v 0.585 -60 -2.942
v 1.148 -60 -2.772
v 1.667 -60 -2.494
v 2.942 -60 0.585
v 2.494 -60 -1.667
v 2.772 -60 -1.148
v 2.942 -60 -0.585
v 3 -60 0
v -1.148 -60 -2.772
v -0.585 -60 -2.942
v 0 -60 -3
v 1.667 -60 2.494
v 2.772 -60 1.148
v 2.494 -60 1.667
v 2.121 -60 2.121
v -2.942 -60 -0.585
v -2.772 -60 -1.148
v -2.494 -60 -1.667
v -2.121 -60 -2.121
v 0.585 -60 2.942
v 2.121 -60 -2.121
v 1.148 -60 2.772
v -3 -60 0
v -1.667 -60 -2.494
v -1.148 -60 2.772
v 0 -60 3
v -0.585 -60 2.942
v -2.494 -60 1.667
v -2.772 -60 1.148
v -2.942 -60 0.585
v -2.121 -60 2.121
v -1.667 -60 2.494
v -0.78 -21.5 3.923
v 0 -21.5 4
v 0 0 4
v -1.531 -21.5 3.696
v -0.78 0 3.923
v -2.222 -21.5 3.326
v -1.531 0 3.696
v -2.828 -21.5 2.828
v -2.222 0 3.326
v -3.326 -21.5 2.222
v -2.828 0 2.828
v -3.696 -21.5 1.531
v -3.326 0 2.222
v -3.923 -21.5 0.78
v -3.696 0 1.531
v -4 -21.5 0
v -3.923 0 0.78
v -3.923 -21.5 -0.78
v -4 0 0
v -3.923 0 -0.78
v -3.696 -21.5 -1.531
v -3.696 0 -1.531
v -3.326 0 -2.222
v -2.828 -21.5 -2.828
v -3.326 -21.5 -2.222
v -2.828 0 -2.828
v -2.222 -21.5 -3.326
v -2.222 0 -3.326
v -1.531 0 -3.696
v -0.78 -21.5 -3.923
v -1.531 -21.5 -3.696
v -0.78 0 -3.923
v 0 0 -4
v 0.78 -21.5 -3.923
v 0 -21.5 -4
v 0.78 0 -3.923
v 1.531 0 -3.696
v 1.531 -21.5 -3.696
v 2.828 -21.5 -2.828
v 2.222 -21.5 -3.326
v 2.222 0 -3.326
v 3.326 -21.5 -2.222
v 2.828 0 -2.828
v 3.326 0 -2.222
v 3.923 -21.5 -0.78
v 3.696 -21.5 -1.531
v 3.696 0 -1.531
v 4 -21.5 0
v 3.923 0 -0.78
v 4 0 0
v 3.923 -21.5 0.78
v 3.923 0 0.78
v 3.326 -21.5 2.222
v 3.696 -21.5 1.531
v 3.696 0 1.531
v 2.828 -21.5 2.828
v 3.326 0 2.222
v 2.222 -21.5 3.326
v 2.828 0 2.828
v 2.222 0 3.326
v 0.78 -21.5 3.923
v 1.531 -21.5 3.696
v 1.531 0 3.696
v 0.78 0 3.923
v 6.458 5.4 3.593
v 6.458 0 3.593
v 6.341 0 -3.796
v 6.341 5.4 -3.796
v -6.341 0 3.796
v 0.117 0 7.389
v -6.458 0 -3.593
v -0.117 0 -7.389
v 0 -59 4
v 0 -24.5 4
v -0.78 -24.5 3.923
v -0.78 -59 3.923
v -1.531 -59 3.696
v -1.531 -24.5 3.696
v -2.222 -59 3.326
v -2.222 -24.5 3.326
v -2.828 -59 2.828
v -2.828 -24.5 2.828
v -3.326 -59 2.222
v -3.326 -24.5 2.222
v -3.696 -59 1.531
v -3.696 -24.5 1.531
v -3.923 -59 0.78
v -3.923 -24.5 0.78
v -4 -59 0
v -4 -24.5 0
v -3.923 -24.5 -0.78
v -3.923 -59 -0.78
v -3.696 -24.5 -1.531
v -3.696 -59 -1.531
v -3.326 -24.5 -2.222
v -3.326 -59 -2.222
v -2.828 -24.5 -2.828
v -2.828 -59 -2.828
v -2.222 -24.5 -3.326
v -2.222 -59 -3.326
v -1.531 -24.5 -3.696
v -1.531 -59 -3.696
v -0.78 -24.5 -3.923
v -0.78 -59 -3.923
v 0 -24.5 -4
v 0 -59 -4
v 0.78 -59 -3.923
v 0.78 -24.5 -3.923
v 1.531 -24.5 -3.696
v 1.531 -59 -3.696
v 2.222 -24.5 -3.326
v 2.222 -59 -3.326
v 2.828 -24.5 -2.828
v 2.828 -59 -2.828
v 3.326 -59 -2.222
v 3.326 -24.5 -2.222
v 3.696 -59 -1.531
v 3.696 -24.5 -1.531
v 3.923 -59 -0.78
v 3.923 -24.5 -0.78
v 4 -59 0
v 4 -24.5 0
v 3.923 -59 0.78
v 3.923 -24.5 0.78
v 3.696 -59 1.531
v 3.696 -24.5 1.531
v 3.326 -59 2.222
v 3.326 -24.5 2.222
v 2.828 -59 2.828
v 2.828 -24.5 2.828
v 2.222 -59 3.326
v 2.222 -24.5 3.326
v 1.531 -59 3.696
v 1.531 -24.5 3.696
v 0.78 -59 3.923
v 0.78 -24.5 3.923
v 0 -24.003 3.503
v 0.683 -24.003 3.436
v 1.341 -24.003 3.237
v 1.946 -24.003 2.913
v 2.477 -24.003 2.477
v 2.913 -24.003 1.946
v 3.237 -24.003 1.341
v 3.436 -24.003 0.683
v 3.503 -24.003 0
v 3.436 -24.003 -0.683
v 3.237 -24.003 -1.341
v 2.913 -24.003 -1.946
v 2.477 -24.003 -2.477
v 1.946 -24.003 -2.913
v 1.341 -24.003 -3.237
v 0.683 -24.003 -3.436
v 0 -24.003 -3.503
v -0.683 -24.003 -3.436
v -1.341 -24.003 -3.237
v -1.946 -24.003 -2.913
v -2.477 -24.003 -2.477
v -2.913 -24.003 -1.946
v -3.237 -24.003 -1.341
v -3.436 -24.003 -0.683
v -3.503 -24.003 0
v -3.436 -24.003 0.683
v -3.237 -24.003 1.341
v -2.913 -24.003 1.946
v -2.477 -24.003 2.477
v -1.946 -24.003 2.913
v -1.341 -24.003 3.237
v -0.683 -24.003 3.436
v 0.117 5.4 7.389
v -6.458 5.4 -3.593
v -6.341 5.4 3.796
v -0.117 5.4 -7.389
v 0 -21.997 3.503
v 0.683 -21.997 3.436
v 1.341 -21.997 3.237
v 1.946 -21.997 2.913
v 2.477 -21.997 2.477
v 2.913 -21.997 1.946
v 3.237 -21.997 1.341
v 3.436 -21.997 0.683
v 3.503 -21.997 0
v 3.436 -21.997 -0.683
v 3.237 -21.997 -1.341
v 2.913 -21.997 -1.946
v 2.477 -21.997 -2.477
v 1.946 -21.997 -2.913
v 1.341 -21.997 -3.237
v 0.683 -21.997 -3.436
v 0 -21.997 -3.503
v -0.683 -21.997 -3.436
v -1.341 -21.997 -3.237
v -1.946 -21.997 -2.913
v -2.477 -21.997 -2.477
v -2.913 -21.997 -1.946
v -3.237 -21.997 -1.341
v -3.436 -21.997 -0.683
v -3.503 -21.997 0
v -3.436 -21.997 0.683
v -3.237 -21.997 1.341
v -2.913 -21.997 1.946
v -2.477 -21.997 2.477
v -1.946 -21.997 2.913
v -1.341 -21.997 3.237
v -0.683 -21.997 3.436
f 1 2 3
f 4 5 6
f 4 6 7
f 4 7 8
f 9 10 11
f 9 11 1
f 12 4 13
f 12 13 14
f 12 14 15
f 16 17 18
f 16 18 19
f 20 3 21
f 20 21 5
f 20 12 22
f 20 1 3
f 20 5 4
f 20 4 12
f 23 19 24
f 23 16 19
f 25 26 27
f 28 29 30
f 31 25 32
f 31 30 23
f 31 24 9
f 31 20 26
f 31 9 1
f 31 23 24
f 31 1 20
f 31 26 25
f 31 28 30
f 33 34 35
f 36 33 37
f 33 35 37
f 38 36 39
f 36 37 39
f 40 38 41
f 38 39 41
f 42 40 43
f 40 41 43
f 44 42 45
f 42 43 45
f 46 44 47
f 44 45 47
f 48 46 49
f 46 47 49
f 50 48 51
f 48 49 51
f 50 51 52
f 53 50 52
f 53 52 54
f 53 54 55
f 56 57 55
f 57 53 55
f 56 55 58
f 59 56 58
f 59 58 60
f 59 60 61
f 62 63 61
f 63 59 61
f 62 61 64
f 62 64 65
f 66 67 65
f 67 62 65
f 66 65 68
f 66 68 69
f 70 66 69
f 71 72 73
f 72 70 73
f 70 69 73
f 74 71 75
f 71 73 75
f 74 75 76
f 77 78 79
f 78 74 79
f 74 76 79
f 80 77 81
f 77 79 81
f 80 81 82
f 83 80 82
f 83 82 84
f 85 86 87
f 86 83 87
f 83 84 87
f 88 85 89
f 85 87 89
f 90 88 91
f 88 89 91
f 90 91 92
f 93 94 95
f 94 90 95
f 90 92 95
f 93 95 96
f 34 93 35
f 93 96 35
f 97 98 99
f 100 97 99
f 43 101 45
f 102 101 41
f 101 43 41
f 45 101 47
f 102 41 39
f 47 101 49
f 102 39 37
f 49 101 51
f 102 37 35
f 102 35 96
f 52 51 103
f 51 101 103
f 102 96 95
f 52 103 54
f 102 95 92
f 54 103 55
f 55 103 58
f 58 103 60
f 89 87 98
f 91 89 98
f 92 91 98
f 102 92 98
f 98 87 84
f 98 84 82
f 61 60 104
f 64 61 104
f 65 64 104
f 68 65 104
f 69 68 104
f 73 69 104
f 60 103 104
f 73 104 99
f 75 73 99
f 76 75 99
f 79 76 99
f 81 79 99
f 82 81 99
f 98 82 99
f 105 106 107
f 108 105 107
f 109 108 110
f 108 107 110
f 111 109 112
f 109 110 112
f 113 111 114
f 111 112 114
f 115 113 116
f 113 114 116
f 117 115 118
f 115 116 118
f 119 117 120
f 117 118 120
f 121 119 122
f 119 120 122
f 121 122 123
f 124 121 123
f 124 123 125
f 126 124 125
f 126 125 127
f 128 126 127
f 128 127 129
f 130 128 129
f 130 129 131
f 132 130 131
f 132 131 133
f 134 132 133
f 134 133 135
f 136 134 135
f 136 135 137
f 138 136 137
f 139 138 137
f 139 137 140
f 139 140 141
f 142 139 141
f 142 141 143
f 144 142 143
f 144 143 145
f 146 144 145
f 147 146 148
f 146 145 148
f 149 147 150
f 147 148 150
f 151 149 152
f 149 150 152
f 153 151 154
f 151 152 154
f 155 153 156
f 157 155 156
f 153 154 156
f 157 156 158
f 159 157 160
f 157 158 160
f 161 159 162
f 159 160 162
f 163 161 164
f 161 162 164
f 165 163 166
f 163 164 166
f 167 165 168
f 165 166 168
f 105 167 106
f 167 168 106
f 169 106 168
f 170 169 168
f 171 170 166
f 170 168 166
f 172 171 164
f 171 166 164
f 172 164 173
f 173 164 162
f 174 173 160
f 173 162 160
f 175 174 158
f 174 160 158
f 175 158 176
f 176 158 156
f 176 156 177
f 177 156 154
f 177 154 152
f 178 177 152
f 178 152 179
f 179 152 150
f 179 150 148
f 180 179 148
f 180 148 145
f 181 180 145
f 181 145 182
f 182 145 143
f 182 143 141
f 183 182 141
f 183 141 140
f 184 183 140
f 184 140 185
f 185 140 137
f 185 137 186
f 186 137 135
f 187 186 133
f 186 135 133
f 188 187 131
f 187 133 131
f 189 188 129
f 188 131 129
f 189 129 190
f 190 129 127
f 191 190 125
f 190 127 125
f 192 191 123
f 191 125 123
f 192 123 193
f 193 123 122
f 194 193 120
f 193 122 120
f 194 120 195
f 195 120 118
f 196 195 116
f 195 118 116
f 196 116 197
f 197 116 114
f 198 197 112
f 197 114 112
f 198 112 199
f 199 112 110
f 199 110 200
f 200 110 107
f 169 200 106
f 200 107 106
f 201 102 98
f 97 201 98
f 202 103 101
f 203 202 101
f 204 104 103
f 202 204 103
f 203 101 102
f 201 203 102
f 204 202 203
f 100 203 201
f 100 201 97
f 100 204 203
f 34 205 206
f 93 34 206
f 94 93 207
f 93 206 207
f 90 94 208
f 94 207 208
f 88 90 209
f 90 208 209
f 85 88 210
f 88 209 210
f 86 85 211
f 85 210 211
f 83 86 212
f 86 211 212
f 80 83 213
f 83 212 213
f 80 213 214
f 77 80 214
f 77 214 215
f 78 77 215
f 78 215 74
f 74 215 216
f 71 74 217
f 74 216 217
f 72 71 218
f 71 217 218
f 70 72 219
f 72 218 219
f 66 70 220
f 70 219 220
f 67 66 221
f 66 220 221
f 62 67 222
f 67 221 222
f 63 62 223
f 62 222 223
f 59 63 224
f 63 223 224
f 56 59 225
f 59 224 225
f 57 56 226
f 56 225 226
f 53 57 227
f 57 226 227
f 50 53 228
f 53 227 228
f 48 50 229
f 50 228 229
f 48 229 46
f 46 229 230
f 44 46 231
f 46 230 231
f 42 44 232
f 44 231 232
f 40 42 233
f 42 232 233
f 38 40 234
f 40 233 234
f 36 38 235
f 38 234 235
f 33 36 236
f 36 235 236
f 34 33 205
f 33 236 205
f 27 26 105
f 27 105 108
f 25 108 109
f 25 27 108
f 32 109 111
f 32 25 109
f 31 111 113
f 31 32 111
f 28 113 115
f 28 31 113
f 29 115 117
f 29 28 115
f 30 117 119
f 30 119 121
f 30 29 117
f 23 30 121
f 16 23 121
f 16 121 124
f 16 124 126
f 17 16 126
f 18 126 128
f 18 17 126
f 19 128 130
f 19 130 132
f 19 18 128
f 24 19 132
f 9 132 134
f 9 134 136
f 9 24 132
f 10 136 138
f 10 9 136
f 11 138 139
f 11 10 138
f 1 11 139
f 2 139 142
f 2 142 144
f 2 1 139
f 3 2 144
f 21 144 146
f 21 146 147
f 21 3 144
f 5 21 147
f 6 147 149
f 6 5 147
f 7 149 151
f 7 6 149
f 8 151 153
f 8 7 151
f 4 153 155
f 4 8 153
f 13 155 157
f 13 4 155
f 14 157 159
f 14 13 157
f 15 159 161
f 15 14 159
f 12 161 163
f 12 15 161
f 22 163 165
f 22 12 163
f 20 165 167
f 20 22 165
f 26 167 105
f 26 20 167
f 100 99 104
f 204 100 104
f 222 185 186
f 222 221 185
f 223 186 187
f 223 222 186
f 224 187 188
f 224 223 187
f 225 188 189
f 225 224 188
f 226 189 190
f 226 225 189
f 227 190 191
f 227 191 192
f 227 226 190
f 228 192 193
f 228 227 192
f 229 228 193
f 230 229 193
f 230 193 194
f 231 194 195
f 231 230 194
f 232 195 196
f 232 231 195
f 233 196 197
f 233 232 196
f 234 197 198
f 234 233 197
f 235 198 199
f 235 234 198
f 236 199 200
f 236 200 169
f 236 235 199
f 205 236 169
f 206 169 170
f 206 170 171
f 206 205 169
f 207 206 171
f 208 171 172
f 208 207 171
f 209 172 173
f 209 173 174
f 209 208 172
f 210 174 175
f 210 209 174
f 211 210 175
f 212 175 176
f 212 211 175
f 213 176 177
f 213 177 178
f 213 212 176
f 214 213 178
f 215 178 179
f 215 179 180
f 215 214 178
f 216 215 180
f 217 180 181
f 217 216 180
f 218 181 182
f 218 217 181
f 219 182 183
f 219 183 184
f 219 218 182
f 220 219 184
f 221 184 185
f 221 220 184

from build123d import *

# Parameters (mm, degrees)
BOSS_EXTRUDE1_DEPTH = 5.4
SKETCH3_R           = 4
BOSS_EXTRUDE2_DEPTH = 60
SKETCH4_R           = 4.399457614
SKETCH4_R_2         = 3.503217006
CUT_EXTRUDE1_DEPTH  = 1
CHAMFER1_SIZE       = 0.5
CHAMFER2_SIZE       = 1


with BuildPart() as part:
    # Sketch1 → Boss-Extrude1 (new body)
    with BuildSketch(Plane(origin=(0, 0, 0), x_dir=(1, 0, 0), z_dir=(0, 1, 0))):
        Polygon((6.457637206, -3.593362639), (6.340761933, 3.795796549), (-0.116875273, 7.389159188), (-6.457637206, 3.593362639), (-6.340761933, -3.795796549), (0.116875273, -7.389159188), align=None)
    extrude(amount=BOSS_EXTRUDE1_DEPTH)

    # Sketch3 → Boss-Extrude2 (add)
    with BuildSketch(Plane.XZ):
        with Locations(Location((0, 0, 0), (0, 0, 90))):
            Circle(SKETCH3_R)
    extrude(amount=BOSS_EXTRUDE2_DEPTH)

    # Sketch4 → Cut-Extrude1 (cut, symmetric)
    with BuildSketch(Plane(origin=(0, -23, 0), x_dir=(-1, 0, 0), z_dir=(0, -1, 0))):
        Circle(SKETCH4_R)
        with Locations(Location((0, 0, 0), (0, 0, 90))):
            Circle(SKETCH4_R_2, mode=Mode.SUBTRACT)
    extrude(amount=CUT_EXTRUDE1_DEPTH, both=True, mode=Mode.SUBTRACT)

    # Chamfer1
    # the kernel refuses this chamfer: 0.5 mm, written as the material it takes off along each edge
    with BuildSketch(Plane(origin=(0, -22, 0), x_dir=(0, 0, 1), z_dir=(-1, 0, 0))) as chamfer1_piece_1_section:
        Polygon((4, CHAMFER1_SIZE), (4 - CHAMFER1_SIZE, 0), (4, 0), align=None)
    chamfer1_piece_1 = revolve(axis=Axis((0, -22, 0), (0, 1, 0)), mode=Mode.PRIVATE)
    chamfer1_piece_1 = chamfer1_piece_1 - Plane(origin=(0, -21.751856144, 0), x_dir=(0, 0, -1), z_dir=(0, 1, 0)) * Cylinder(3.503217006, 16, mode=Mode.PRIVATE)
    add(chamfer1_piece_1, mode=Mode.SUBTRACT)
    with BuildSketch(Plane(origin=(0, -24, 0), x_dir=(0, 0, 1), z_dir=(-1, 0, 0))) as chamfer1_piece_2_section:
        Polygon((4 - CHAMFER1_SIZE, 0), (4, -CHAMFER1_SIZE), (4, 0), align=None)
    chamfer1_piece_2 = revolve(axis=Axis((0, -24, 0), (0, 1, 0)), mode=Mode.PRIVATE)
    chamfer1_piece_2 = chamfer1_piece_2 - Plane(origin=(0, -24.248143856, 0), x_dir=(0, 0, -1), z_dir=(0, 1, 0)) * Cylinder(3.503217006, 16, mode=Mode.PRIVATE)
    add(chamfer1_piece_2, mode=Mode.SUBTRACT)

    # Chamfer2
    chamfer2_edges = [part.edges().sort_by_distance(p)[0] for p in [
        (0, -60, -4),
    ]]
    chamfer(chamfer2_edges, length=CHAMFER2_SIZE)


solid = part.part
